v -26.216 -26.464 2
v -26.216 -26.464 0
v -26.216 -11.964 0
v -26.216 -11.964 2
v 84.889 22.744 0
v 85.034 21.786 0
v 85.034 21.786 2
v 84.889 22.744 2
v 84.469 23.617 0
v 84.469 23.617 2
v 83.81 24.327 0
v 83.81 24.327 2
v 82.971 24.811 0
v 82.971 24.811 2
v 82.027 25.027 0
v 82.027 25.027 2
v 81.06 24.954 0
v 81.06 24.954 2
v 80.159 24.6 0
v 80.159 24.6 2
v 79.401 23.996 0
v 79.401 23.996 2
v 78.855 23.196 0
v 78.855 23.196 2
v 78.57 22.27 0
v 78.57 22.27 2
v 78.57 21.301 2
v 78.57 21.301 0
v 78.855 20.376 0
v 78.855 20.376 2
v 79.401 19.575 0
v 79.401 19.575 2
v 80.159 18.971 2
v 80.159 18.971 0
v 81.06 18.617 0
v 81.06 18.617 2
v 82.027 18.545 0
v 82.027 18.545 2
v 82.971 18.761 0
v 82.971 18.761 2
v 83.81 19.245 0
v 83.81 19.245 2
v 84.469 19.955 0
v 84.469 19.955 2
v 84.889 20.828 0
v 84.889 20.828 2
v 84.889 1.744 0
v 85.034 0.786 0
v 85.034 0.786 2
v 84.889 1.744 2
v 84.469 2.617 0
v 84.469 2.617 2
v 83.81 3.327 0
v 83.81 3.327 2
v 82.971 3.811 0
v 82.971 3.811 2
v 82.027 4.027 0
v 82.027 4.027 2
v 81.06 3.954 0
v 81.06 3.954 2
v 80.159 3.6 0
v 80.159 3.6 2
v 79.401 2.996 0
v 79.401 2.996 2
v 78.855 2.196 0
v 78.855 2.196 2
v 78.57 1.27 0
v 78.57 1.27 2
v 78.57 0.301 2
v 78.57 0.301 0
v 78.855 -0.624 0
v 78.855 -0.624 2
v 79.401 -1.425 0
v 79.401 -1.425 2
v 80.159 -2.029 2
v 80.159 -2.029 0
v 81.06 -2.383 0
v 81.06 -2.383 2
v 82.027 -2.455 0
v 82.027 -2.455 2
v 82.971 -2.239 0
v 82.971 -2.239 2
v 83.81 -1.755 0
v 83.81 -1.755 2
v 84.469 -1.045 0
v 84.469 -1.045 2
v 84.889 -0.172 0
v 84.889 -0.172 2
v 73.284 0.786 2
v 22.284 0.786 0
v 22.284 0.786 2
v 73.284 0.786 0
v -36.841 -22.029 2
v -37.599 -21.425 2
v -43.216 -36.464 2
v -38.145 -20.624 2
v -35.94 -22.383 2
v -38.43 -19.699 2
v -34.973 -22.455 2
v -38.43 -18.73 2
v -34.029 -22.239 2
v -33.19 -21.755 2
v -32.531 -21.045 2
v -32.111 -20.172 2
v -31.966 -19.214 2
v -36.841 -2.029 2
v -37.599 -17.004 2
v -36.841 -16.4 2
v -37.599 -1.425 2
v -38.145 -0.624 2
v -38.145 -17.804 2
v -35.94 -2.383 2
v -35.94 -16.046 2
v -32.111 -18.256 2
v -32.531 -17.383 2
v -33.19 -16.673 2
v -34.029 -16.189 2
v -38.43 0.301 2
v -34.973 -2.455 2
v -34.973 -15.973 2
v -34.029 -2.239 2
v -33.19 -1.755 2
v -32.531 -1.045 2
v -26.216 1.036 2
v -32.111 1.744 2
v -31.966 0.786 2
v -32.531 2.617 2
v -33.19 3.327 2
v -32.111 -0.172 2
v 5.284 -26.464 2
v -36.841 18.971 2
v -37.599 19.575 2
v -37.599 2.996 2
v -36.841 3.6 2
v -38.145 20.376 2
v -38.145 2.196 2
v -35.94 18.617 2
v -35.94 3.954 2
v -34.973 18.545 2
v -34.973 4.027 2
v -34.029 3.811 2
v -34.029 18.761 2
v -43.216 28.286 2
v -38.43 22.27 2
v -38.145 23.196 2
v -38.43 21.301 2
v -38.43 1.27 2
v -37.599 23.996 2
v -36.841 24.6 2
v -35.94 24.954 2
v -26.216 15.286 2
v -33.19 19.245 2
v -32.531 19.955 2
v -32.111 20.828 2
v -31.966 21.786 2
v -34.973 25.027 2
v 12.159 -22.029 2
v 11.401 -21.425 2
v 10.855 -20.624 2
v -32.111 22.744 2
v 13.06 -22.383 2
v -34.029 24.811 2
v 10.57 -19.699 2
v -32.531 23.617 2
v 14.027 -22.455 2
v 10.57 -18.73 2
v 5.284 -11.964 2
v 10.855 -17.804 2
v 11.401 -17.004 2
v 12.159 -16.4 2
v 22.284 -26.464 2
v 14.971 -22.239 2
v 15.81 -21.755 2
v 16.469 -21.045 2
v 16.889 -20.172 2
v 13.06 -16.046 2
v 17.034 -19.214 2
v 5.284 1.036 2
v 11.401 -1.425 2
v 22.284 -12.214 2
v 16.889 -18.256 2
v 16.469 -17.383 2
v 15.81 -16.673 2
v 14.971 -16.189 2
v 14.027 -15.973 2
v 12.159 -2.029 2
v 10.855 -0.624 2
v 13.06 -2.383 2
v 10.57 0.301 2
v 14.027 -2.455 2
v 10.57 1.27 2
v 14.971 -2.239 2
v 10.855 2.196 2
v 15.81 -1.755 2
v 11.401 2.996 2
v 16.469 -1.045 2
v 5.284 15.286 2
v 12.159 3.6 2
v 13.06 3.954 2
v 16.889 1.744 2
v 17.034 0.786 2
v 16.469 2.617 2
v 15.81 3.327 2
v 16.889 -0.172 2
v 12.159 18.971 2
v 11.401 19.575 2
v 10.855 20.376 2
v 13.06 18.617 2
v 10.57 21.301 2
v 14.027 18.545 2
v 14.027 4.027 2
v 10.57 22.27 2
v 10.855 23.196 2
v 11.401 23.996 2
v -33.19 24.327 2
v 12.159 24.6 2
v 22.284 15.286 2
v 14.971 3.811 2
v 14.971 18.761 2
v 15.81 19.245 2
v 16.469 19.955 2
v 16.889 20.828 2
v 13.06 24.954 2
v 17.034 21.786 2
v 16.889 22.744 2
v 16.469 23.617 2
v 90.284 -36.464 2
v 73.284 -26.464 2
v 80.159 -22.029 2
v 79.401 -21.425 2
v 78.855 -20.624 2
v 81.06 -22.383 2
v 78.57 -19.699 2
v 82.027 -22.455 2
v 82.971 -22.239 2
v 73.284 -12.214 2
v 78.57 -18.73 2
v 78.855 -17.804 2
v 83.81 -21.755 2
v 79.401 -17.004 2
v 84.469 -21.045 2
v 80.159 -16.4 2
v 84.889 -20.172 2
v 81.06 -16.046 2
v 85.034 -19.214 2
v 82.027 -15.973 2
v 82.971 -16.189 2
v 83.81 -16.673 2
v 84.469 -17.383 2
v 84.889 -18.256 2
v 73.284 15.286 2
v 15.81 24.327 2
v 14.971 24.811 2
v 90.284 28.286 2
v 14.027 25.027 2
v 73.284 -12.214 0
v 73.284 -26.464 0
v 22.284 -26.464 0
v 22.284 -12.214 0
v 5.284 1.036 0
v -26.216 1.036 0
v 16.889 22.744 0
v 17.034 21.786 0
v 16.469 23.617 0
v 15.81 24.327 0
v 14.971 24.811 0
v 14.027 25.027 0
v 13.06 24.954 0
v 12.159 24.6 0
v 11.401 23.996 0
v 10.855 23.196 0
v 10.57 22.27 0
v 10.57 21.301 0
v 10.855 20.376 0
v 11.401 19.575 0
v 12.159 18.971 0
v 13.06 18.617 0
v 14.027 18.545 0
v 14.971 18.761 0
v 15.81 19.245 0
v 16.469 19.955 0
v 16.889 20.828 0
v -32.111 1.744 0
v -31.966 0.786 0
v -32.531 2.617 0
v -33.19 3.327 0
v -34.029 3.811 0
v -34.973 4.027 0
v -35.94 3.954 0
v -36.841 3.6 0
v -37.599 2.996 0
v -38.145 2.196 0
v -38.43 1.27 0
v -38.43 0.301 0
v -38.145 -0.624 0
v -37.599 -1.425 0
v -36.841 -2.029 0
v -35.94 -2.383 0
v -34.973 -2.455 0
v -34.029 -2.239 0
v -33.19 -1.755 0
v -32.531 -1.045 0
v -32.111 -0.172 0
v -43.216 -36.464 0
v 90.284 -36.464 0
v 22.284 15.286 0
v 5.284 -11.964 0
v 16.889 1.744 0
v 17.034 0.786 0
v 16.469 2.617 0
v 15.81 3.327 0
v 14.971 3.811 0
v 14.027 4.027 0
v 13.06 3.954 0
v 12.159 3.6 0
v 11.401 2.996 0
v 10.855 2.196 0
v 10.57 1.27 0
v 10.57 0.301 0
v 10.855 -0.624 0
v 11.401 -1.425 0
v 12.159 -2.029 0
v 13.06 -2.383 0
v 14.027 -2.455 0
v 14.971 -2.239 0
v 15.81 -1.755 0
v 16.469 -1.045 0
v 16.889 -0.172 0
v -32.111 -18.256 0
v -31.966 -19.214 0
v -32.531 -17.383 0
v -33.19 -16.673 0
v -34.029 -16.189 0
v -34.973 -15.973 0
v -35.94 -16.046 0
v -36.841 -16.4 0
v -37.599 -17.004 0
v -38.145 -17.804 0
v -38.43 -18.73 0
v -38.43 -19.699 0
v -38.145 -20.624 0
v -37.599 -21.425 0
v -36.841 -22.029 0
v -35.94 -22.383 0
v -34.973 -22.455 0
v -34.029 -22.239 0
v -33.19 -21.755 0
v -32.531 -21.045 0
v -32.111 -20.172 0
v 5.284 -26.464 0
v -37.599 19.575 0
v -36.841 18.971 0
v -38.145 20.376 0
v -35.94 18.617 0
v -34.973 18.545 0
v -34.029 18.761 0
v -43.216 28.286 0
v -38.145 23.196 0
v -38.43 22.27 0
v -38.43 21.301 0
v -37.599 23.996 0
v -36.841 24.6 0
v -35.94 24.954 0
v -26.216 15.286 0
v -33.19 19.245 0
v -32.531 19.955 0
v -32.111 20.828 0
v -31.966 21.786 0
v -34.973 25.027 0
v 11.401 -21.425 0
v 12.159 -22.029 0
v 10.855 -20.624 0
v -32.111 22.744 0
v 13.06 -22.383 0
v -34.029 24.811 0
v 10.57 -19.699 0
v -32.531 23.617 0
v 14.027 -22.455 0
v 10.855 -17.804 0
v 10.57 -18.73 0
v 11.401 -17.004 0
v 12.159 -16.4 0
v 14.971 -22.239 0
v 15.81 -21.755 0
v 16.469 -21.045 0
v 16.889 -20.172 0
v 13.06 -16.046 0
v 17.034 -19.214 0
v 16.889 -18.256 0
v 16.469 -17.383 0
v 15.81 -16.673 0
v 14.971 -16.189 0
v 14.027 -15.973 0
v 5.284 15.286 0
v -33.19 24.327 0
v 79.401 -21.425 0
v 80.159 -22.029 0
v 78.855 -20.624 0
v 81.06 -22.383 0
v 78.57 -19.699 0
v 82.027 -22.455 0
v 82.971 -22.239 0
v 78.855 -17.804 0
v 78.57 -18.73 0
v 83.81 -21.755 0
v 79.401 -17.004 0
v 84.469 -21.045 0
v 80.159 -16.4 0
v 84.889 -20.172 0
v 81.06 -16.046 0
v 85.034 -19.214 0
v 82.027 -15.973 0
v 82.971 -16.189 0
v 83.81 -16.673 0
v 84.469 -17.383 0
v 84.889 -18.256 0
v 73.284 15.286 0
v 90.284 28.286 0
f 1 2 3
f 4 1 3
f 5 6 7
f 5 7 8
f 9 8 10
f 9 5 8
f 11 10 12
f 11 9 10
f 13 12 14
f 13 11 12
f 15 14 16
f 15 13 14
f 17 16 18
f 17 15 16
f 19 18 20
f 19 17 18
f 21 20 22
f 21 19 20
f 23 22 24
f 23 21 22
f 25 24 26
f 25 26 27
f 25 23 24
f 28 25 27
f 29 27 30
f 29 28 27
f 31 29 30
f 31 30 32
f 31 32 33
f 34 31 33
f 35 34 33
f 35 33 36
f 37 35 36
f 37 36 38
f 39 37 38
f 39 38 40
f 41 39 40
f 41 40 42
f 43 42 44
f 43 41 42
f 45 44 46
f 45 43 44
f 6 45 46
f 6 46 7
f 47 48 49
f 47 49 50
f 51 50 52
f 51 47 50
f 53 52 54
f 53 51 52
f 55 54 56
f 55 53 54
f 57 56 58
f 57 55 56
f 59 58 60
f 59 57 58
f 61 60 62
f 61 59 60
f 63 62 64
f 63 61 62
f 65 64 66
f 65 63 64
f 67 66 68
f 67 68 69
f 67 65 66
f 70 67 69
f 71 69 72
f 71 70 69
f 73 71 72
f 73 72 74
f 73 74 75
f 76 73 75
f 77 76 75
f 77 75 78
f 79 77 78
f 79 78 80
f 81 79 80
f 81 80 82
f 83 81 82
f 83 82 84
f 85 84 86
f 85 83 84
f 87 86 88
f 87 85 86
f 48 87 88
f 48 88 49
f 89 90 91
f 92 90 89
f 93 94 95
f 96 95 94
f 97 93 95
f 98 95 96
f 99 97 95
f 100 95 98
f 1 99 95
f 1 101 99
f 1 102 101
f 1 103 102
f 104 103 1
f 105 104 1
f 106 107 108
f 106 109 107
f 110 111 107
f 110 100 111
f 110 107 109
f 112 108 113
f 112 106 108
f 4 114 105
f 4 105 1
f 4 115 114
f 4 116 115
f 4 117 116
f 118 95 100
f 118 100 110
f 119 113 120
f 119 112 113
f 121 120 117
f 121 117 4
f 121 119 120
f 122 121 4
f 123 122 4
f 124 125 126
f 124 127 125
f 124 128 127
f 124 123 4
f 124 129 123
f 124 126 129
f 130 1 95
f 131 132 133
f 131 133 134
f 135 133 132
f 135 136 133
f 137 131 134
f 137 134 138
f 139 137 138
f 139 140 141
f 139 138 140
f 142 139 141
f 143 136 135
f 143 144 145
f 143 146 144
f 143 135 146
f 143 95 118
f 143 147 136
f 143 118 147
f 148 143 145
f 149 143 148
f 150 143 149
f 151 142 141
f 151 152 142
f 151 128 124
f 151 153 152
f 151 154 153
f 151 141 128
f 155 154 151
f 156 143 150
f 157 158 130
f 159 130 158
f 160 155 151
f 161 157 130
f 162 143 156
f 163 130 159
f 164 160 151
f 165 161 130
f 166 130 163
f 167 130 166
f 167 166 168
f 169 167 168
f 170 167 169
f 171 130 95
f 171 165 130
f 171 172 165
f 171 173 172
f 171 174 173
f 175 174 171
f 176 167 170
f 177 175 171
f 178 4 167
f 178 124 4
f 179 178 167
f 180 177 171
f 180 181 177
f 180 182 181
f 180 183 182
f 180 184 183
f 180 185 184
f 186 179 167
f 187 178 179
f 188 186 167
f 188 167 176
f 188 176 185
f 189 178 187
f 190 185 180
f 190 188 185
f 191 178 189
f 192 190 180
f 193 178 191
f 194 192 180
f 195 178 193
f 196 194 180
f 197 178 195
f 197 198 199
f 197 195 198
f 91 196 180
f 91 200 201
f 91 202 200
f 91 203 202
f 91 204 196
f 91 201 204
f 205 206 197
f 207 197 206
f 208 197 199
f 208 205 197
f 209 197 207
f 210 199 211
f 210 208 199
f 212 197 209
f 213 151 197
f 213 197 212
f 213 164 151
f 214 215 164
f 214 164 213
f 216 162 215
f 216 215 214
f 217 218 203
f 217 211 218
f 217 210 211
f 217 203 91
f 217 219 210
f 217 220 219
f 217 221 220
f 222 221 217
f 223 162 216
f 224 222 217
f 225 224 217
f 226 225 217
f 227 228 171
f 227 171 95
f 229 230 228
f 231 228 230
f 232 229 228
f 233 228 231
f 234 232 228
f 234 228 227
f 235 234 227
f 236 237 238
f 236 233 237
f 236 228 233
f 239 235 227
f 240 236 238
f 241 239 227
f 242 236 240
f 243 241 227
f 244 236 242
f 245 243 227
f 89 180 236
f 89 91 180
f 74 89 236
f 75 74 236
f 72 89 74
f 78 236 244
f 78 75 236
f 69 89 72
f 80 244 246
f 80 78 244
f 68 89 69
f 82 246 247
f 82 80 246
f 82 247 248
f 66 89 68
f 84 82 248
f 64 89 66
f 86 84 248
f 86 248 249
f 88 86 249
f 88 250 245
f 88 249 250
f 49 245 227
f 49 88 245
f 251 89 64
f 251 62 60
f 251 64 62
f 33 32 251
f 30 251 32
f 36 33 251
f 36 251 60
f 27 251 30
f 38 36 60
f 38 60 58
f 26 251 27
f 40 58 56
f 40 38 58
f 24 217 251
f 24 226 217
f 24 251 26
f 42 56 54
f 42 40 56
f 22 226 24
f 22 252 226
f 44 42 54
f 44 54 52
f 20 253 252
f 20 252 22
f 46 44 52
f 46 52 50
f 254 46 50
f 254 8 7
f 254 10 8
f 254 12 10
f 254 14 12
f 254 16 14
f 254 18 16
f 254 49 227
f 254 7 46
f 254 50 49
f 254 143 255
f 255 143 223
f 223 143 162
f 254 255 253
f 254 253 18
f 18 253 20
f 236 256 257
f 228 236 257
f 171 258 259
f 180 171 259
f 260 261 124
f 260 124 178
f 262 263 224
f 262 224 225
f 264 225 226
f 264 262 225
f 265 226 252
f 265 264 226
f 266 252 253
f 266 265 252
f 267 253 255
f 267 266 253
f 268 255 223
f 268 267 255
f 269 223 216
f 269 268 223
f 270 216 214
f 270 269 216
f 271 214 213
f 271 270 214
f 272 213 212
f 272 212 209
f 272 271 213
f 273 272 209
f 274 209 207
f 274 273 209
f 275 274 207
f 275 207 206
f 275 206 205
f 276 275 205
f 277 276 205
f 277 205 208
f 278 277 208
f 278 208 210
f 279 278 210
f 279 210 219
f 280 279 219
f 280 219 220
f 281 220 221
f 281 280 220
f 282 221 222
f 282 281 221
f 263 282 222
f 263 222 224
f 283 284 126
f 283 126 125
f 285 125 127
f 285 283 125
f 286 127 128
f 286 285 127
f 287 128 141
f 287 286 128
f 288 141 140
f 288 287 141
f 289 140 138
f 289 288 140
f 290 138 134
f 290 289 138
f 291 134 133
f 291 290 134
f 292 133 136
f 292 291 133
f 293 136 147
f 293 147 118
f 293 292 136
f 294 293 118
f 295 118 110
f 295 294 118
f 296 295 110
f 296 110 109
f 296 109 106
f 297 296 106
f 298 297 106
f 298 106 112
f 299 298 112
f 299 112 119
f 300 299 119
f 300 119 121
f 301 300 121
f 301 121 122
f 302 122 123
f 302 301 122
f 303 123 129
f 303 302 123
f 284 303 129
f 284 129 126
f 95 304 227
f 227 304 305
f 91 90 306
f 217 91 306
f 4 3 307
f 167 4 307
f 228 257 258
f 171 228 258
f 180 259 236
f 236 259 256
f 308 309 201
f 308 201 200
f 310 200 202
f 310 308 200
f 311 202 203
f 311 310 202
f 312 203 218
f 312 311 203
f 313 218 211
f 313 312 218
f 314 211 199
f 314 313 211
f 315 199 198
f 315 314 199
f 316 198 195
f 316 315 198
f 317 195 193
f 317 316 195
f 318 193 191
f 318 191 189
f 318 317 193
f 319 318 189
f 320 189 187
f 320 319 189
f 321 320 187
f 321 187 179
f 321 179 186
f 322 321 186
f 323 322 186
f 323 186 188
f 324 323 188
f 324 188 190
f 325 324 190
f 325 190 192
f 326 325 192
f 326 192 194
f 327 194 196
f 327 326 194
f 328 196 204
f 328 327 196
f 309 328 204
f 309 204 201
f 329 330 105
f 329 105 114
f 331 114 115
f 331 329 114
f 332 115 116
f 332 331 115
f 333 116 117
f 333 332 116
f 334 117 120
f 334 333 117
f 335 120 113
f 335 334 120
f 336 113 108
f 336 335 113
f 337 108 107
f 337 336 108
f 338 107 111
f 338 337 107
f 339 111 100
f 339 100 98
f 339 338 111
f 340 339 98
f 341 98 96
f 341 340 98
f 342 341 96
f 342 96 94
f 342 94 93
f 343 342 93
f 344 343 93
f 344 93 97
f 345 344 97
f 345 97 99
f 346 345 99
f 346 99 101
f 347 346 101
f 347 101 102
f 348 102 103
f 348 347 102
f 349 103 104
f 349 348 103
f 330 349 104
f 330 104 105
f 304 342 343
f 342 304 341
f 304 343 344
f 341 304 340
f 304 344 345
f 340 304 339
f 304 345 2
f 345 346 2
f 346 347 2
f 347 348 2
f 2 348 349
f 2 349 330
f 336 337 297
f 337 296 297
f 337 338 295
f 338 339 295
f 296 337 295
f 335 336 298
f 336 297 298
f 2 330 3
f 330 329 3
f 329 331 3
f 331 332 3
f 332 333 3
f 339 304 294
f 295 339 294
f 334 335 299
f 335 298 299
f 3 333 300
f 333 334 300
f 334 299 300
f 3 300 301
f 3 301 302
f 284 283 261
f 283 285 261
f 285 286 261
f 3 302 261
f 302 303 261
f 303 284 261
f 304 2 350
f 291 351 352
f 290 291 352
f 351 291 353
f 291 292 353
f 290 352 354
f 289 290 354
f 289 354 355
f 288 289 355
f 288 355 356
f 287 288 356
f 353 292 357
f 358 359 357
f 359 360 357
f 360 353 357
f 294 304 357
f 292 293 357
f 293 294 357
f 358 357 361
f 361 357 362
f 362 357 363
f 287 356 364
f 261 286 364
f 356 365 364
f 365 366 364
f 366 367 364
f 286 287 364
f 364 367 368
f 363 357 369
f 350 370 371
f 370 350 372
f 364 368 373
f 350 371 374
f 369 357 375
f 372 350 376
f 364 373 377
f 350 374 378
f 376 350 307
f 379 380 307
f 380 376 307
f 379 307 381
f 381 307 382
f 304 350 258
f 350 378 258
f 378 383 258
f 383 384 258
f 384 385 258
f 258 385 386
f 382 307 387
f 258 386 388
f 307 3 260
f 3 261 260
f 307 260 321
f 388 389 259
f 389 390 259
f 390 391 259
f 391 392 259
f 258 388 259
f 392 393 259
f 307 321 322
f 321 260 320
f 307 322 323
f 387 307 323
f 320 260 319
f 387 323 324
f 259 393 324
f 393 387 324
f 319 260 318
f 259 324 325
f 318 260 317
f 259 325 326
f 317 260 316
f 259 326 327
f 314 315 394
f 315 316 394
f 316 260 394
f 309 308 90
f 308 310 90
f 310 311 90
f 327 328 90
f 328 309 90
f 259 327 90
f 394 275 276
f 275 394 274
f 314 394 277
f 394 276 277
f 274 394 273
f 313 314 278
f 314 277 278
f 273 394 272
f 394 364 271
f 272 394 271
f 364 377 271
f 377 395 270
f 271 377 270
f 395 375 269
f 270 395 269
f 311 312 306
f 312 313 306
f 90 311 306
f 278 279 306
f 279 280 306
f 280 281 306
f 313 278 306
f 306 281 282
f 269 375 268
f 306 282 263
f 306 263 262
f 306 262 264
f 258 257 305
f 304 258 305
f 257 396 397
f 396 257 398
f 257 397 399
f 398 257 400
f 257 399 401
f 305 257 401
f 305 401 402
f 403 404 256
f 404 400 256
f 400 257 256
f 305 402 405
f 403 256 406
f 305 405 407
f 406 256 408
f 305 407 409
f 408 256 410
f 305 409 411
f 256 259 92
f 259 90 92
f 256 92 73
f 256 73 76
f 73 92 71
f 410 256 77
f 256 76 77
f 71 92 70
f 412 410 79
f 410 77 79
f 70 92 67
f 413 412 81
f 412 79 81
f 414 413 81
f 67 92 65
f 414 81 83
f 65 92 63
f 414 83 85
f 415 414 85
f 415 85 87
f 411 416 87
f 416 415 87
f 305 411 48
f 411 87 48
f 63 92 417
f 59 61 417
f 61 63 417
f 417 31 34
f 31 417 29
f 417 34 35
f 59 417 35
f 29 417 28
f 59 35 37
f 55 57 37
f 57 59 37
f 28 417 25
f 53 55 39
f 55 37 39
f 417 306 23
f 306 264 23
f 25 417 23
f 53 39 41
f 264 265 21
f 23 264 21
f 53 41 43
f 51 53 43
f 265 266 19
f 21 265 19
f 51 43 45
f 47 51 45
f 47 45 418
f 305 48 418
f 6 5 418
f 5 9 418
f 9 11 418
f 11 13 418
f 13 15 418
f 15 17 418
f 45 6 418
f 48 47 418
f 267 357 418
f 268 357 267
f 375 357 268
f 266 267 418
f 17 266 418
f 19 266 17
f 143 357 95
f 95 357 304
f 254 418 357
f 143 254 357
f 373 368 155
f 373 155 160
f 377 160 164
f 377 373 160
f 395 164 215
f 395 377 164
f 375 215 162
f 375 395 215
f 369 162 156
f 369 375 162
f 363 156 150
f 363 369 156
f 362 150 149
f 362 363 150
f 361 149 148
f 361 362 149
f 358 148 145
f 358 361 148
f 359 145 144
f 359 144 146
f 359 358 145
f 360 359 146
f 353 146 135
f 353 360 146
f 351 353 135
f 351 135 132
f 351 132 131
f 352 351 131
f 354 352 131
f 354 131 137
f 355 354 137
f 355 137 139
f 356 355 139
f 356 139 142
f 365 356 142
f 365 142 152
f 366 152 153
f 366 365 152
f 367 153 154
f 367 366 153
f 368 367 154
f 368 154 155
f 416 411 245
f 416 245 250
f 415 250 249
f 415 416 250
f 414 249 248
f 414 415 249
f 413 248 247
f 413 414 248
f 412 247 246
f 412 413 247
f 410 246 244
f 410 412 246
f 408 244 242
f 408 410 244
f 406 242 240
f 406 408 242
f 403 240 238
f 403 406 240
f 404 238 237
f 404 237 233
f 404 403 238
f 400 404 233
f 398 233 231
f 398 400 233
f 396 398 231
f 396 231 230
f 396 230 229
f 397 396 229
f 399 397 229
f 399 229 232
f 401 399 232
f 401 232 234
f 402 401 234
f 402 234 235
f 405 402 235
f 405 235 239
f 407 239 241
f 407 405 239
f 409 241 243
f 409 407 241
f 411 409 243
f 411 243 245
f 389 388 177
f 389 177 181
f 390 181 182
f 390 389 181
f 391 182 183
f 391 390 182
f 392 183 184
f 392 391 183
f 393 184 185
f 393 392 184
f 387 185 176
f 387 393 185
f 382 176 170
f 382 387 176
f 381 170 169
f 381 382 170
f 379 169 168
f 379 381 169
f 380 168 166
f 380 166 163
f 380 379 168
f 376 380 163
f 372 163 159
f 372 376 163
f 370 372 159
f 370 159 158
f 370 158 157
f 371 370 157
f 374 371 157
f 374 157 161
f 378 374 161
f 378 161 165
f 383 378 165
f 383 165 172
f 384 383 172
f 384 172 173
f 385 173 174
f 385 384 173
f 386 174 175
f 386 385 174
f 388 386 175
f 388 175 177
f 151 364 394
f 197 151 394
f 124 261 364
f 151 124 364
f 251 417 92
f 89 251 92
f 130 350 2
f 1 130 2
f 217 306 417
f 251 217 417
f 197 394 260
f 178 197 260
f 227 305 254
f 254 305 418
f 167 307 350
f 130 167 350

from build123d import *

# Parameters (mm, degrees)
F0_R     = 3.25
F0_W     = 31.5
F0_H     = 13
F0_W_2   = 51
F1_DEPTH = 2
F2_DEPTH = 2


# Not quite as in the source:
# - a feature names something its author has since deleted; it is built from what else it names


with BuildPart() as f1:
    # F0 (on Top) → F1 (new body)
    with BuildSketch(Plane.XY):
        Polygon((-26.2163661122, 15.2858447556), (-43.2163661122, 15.2858447556), (-43.2163661122, -26.4641552444), (-26.2163661122, -26.4641552444), (-26.2163661122, -11.9641552444), (-26.2163661122, 1.0358447556), align=None)
        with Locations((-35.2163661122, -19.2141552444)):
            Circle(F0_R, mode=Mode.SUBTRACT)
        with Locations((-35.2163661122, 0.7858447556)):
            Circle(F0_R, mode=Mode.SUBTRACT)
        Polygon((22.2836338878, 15.2858447556), (5.2836338878, 15.2858447556), (5.2836338878, 1.0358447556), (5.2836338878, -11.9641552444), (5.2836338878, -26.4641552444), (22.2836338878, -26.4641552444), (22.2836338878, -12.2141552444), (22.2836338878, 0.7858447556), align=None)
        with Locations((13.7836338878, -19.2141552444)):
            Circle(F0_R, mode=Mode.SUBTRACT)
        with Locations((13.7836338878, 0.7858447556)):
            Circle(F0_R, mode=Mode.SUBTRACT)
        Polygon((90.2836338878, -26.4641552444), (90.2836338878, 15.2858447556), (73.2836338878, 15.2858447556), (73.2836338878, 0.7858447556), (73.2836338878, -12.2141552444), (73.2836338878, -26.4641552444), align=None)
        with Locations((81.7836338878, -19.2141552444)):
            Circle(F0_R, mode=Mode.SUBTRACT)
        with Locations((81.7836338878, 0.7858447556)):
            Circle(F0_R, mode=Mode.SUBTRACT)
        Polygon((-26.2163661122, -26.4641552444), (-43.2163661122, -26.4641552444), (-43.2163661122, -36.4641552444), (90.2836338878, -36.4641552444), (90.2836338878, -26.4641552444), (73.2836338878, -26.4641552444), (22.2836338878, -26.4641552444), (5.2836338878, -26.4641552444), align=None)
        with Locations((-10.4663661122, -5.4641552444)):
            Rectangle(F0_W, F0_H)
        with Locations((47.7836338878, -5.7141552444)):
            Rectangle(F0_W_2, F0_H)
    extrude(amount=F1_DEPTH)

    # F0 (on Top) → F2 (join)
    with BuildSketch(Plane.XY):
        Polygon((90.2836338878, 28.2858447556), (-43.2163661122, 28.2858447556), (-43.2163661122, 15.2858447556), (-26.2163661122, 15.2858447556), (5.2836338878, 15.2858447556), (22.2836338878, 15.2858447556), (73.2836338878, 15.2858447556), (90.2836338878, 15.2858447556), align=None)
        with Locations((-35.2163661122, 21.7858447556)):
            Circle(F0_R, mode=Mode.SUBTRACT)
        with Locations((13.7836338878, 21.7858447556)):
            Circle(F0_R, mode=Mode.SUBTRACT)
        with Locations((81.7836338878, 21.7858447556)):
            Circle(F0_R, mode=Mode.SUBTRACT)
    extrude(amount=F2_DEPTH)


solid = f1.part
